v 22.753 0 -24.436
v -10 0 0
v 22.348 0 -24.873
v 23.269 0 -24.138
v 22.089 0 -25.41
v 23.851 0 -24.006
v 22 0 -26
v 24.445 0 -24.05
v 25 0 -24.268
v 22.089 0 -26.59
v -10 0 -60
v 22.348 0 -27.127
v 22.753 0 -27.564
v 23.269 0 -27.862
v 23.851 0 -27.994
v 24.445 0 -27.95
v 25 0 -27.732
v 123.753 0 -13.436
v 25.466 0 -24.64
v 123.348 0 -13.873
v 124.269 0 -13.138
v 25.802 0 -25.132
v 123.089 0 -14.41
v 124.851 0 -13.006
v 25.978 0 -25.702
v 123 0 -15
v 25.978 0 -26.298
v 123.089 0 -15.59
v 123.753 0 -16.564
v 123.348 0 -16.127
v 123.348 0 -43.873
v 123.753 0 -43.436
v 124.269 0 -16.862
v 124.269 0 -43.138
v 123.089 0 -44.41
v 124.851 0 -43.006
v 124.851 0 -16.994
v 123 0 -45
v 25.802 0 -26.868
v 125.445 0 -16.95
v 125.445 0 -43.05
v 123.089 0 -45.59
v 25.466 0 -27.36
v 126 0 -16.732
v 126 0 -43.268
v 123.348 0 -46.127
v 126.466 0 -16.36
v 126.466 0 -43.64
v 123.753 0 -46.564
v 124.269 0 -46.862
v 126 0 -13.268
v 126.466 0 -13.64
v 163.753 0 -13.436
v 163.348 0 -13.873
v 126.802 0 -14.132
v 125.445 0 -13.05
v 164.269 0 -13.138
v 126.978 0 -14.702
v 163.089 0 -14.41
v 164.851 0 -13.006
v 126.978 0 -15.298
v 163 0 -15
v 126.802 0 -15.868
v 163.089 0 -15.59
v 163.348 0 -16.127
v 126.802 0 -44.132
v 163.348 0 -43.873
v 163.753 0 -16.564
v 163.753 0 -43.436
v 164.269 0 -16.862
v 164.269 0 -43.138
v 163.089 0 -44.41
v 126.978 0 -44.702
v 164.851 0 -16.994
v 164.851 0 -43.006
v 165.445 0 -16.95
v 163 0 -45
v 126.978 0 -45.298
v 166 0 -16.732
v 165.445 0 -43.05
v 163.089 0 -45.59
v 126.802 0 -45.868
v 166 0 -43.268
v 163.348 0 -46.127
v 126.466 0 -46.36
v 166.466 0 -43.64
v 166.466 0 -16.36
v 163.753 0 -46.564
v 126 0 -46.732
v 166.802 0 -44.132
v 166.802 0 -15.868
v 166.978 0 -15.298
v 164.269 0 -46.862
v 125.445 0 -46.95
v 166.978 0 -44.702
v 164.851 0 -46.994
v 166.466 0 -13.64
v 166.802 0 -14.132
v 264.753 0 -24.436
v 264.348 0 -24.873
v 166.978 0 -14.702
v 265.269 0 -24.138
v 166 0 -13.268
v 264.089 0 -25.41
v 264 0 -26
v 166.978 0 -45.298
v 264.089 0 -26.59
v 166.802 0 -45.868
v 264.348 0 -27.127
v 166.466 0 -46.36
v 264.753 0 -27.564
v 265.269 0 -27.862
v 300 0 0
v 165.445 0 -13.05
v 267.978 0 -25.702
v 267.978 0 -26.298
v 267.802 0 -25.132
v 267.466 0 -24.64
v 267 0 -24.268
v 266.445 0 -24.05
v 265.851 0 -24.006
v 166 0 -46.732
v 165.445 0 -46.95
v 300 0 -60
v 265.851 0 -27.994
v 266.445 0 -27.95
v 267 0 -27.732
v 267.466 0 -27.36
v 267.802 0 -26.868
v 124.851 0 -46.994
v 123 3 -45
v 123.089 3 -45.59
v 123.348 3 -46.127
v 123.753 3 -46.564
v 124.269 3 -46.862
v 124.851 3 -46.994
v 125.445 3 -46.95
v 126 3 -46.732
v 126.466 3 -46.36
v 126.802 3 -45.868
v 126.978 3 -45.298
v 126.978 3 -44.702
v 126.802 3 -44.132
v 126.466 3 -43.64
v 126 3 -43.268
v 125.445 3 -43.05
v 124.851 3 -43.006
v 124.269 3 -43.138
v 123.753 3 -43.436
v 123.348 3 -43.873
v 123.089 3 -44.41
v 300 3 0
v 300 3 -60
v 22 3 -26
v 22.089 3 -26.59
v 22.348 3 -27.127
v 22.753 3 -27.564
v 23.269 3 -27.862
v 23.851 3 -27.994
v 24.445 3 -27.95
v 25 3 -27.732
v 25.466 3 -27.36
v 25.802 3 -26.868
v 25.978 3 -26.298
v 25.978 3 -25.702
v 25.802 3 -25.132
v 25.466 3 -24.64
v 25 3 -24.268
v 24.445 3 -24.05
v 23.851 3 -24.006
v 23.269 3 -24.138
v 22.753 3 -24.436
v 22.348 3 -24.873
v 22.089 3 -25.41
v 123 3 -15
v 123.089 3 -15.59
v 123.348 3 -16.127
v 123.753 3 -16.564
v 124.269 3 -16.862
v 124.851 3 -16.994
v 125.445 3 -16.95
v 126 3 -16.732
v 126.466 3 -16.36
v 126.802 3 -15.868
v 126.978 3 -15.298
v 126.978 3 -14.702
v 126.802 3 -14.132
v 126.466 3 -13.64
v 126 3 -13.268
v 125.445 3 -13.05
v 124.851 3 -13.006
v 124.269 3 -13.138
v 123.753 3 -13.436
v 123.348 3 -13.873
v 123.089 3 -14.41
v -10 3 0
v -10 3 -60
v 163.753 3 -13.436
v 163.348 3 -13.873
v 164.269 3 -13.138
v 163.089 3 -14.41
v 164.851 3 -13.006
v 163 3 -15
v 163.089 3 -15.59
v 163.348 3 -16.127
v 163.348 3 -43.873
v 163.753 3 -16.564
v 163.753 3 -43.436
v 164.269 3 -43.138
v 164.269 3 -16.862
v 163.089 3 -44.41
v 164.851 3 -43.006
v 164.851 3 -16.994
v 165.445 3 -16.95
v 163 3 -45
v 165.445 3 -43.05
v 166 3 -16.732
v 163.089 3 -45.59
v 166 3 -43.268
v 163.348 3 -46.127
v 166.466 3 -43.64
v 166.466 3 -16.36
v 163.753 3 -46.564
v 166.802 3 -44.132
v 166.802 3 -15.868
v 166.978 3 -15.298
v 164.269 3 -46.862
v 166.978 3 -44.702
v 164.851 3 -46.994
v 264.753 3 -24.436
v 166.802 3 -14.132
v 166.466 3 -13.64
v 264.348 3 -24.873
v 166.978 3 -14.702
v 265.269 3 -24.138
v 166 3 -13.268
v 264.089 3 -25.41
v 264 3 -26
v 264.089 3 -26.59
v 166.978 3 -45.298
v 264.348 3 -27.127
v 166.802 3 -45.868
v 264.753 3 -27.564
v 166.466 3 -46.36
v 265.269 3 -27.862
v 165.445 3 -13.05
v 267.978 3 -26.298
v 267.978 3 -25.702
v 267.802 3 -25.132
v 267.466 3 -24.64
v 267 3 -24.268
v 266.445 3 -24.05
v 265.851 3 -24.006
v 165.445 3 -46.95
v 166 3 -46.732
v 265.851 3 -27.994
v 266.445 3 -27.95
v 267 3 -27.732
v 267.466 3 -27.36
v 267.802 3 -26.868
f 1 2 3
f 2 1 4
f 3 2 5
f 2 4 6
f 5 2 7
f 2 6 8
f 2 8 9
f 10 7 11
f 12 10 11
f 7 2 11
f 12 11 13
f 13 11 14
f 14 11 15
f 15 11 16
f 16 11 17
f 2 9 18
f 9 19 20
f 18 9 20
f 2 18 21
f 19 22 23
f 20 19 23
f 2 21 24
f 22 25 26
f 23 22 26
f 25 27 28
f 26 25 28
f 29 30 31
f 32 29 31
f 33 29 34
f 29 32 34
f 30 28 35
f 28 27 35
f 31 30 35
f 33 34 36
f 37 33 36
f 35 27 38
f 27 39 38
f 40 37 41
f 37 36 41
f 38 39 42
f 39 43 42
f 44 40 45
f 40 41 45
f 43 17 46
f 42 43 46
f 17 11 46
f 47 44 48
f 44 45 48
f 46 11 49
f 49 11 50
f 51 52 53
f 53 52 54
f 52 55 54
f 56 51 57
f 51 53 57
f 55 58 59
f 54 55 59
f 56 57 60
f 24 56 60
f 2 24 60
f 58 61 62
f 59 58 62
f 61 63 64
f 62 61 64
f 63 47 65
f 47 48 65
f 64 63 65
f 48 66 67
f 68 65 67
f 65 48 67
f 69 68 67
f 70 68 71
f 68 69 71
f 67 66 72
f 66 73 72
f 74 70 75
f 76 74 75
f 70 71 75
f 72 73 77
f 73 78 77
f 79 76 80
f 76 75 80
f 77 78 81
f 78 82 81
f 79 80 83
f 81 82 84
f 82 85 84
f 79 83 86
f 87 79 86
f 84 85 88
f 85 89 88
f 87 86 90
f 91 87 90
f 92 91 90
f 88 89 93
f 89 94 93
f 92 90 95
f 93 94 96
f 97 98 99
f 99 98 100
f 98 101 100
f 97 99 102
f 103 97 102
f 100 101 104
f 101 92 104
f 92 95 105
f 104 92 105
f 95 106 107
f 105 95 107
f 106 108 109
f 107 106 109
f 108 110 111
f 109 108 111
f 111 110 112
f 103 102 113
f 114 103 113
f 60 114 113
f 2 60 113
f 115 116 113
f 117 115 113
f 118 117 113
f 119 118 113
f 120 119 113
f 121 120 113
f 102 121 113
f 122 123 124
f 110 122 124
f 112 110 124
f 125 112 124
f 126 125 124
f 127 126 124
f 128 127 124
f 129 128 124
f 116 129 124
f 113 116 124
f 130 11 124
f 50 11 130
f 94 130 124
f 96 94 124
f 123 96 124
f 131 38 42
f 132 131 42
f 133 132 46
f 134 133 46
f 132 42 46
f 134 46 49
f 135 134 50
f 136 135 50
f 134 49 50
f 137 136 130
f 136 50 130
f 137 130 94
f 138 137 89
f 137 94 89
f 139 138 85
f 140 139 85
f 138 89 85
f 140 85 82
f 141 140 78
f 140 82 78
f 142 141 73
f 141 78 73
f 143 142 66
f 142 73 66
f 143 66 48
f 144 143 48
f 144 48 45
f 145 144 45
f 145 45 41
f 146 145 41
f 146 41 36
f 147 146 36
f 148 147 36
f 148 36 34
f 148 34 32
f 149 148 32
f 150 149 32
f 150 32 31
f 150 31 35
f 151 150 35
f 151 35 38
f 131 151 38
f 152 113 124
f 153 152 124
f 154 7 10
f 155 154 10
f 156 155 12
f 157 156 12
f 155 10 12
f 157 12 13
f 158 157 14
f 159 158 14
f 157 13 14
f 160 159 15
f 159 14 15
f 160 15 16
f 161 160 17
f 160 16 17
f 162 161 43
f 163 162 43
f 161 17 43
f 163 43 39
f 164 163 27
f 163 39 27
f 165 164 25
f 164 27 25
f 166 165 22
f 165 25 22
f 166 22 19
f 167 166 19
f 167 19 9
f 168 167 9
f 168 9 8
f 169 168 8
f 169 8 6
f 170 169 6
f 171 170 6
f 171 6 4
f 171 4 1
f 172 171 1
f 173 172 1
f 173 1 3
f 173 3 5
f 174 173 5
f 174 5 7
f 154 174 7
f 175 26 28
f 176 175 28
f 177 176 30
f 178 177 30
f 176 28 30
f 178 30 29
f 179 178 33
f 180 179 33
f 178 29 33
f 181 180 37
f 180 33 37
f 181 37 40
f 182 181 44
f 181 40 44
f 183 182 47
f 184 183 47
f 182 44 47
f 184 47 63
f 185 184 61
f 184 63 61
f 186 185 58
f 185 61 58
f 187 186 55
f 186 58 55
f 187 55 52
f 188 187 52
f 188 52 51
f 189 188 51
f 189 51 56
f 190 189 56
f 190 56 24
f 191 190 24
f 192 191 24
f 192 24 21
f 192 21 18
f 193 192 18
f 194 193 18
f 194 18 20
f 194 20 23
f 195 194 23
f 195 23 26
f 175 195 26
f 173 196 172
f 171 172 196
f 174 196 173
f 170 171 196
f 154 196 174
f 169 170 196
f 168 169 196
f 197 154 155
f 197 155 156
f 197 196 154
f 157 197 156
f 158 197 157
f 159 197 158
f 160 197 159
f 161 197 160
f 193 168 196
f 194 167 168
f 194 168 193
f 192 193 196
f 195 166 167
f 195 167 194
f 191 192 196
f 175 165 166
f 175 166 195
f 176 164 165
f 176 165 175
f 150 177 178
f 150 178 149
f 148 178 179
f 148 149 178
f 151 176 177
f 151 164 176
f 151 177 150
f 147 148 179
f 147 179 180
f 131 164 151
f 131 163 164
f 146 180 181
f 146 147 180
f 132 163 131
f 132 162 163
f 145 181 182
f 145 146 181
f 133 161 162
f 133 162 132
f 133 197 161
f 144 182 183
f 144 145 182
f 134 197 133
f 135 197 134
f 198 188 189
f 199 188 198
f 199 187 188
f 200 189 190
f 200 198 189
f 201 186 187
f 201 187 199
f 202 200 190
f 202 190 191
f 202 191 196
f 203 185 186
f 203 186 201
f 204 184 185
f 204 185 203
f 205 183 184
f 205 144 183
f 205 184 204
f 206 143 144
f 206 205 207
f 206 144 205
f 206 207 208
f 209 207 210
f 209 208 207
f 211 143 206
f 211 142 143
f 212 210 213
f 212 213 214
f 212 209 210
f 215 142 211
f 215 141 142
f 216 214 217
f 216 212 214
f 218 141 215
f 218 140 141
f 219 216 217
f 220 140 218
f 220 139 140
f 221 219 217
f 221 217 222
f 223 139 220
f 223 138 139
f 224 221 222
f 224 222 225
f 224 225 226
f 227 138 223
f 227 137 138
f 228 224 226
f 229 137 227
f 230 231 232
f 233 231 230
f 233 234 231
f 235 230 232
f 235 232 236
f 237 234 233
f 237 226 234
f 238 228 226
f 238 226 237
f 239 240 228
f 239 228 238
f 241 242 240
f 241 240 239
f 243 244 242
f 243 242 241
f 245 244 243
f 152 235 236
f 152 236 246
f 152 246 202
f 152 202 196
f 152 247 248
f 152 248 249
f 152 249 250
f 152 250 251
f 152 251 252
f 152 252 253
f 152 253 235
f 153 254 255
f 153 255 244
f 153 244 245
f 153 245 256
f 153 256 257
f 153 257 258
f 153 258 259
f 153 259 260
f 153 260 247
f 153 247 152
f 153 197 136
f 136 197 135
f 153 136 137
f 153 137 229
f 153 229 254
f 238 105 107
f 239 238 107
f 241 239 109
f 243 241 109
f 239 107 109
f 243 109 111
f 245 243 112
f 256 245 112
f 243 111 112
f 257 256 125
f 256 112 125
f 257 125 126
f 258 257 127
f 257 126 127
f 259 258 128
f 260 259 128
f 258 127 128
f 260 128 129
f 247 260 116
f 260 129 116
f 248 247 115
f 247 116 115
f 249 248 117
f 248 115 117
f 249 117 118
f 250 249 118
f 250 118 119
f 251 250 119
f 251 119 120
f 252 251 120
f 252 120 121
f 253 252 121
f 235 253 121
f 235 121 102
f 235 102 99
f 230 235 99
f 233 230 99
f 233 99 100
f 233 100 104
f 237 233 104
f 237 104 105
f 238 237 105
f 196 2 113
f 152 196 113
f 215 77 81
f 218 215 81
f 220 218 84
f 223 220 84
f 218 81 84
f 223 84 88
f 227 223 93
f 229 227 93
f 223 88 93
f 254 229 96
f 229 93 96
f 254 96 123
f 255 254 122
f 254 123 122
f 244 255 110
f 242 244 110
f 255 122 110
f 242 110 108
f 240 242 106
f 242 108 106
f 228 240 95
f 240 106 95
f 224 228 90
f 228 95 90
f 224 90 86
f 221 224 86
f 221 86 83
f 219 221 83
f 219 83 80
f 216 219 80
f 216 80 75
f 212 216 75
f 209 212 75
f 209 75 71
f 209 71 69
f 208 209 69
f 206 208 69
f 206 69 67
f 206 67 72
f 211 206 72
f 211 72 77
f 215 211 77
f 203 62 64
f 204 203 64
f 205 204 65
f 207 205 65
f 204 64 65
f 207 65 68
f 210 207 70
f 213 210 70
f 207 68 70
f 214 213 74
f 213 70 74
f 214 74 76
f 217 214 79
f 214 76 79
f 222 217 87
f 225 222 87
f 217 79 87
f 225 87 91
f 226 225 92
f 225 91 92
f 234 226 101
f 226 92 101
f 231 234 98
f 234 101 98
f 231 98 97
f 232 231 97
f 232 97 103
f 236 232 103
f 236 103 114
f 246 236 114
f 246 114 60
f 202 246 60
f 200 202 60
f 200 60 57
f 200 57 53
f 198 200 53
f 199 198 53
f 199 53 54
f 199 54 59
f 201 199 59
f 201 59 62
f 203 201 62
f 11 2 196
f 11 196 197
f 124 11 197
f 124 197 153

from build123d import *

# Parameters (mm, degrees)
SKETCH1_W           = 310
SKETCH1_H           = 60
BOSS_EXTRUDE1_DEPTH = 3
OTW_R_POD_RUB_M41_D = 4


with BuildPart() as part:
    # Sketch1 → Boss-Extrude1 (new body)
    with BuildSketch(Plane(origin=(0, 0, 0), x_dir=(1, 0, 0), z_dir=(0, 1, 0))):
        with Locations((145, 30)):
            Rectangle(SKETCH1_W, SKETCH1_H)
    extrude(amount=BOSS_EXTRUDE1_DEPTH)

    # Otwór pod śrubę M41 (through all)
    with Locations(Plane(origin=(0, 3, 0), x_dir=(1, 0, 0), z_dir=(0, 1, 0))):
        with Locations((266, 26), (24, 26), (125, 15), (165, 15), (165, 45), (125, 45)):
            Hole(OTW_R_POD_RUB_M41_D / 2)


solid = part.part
